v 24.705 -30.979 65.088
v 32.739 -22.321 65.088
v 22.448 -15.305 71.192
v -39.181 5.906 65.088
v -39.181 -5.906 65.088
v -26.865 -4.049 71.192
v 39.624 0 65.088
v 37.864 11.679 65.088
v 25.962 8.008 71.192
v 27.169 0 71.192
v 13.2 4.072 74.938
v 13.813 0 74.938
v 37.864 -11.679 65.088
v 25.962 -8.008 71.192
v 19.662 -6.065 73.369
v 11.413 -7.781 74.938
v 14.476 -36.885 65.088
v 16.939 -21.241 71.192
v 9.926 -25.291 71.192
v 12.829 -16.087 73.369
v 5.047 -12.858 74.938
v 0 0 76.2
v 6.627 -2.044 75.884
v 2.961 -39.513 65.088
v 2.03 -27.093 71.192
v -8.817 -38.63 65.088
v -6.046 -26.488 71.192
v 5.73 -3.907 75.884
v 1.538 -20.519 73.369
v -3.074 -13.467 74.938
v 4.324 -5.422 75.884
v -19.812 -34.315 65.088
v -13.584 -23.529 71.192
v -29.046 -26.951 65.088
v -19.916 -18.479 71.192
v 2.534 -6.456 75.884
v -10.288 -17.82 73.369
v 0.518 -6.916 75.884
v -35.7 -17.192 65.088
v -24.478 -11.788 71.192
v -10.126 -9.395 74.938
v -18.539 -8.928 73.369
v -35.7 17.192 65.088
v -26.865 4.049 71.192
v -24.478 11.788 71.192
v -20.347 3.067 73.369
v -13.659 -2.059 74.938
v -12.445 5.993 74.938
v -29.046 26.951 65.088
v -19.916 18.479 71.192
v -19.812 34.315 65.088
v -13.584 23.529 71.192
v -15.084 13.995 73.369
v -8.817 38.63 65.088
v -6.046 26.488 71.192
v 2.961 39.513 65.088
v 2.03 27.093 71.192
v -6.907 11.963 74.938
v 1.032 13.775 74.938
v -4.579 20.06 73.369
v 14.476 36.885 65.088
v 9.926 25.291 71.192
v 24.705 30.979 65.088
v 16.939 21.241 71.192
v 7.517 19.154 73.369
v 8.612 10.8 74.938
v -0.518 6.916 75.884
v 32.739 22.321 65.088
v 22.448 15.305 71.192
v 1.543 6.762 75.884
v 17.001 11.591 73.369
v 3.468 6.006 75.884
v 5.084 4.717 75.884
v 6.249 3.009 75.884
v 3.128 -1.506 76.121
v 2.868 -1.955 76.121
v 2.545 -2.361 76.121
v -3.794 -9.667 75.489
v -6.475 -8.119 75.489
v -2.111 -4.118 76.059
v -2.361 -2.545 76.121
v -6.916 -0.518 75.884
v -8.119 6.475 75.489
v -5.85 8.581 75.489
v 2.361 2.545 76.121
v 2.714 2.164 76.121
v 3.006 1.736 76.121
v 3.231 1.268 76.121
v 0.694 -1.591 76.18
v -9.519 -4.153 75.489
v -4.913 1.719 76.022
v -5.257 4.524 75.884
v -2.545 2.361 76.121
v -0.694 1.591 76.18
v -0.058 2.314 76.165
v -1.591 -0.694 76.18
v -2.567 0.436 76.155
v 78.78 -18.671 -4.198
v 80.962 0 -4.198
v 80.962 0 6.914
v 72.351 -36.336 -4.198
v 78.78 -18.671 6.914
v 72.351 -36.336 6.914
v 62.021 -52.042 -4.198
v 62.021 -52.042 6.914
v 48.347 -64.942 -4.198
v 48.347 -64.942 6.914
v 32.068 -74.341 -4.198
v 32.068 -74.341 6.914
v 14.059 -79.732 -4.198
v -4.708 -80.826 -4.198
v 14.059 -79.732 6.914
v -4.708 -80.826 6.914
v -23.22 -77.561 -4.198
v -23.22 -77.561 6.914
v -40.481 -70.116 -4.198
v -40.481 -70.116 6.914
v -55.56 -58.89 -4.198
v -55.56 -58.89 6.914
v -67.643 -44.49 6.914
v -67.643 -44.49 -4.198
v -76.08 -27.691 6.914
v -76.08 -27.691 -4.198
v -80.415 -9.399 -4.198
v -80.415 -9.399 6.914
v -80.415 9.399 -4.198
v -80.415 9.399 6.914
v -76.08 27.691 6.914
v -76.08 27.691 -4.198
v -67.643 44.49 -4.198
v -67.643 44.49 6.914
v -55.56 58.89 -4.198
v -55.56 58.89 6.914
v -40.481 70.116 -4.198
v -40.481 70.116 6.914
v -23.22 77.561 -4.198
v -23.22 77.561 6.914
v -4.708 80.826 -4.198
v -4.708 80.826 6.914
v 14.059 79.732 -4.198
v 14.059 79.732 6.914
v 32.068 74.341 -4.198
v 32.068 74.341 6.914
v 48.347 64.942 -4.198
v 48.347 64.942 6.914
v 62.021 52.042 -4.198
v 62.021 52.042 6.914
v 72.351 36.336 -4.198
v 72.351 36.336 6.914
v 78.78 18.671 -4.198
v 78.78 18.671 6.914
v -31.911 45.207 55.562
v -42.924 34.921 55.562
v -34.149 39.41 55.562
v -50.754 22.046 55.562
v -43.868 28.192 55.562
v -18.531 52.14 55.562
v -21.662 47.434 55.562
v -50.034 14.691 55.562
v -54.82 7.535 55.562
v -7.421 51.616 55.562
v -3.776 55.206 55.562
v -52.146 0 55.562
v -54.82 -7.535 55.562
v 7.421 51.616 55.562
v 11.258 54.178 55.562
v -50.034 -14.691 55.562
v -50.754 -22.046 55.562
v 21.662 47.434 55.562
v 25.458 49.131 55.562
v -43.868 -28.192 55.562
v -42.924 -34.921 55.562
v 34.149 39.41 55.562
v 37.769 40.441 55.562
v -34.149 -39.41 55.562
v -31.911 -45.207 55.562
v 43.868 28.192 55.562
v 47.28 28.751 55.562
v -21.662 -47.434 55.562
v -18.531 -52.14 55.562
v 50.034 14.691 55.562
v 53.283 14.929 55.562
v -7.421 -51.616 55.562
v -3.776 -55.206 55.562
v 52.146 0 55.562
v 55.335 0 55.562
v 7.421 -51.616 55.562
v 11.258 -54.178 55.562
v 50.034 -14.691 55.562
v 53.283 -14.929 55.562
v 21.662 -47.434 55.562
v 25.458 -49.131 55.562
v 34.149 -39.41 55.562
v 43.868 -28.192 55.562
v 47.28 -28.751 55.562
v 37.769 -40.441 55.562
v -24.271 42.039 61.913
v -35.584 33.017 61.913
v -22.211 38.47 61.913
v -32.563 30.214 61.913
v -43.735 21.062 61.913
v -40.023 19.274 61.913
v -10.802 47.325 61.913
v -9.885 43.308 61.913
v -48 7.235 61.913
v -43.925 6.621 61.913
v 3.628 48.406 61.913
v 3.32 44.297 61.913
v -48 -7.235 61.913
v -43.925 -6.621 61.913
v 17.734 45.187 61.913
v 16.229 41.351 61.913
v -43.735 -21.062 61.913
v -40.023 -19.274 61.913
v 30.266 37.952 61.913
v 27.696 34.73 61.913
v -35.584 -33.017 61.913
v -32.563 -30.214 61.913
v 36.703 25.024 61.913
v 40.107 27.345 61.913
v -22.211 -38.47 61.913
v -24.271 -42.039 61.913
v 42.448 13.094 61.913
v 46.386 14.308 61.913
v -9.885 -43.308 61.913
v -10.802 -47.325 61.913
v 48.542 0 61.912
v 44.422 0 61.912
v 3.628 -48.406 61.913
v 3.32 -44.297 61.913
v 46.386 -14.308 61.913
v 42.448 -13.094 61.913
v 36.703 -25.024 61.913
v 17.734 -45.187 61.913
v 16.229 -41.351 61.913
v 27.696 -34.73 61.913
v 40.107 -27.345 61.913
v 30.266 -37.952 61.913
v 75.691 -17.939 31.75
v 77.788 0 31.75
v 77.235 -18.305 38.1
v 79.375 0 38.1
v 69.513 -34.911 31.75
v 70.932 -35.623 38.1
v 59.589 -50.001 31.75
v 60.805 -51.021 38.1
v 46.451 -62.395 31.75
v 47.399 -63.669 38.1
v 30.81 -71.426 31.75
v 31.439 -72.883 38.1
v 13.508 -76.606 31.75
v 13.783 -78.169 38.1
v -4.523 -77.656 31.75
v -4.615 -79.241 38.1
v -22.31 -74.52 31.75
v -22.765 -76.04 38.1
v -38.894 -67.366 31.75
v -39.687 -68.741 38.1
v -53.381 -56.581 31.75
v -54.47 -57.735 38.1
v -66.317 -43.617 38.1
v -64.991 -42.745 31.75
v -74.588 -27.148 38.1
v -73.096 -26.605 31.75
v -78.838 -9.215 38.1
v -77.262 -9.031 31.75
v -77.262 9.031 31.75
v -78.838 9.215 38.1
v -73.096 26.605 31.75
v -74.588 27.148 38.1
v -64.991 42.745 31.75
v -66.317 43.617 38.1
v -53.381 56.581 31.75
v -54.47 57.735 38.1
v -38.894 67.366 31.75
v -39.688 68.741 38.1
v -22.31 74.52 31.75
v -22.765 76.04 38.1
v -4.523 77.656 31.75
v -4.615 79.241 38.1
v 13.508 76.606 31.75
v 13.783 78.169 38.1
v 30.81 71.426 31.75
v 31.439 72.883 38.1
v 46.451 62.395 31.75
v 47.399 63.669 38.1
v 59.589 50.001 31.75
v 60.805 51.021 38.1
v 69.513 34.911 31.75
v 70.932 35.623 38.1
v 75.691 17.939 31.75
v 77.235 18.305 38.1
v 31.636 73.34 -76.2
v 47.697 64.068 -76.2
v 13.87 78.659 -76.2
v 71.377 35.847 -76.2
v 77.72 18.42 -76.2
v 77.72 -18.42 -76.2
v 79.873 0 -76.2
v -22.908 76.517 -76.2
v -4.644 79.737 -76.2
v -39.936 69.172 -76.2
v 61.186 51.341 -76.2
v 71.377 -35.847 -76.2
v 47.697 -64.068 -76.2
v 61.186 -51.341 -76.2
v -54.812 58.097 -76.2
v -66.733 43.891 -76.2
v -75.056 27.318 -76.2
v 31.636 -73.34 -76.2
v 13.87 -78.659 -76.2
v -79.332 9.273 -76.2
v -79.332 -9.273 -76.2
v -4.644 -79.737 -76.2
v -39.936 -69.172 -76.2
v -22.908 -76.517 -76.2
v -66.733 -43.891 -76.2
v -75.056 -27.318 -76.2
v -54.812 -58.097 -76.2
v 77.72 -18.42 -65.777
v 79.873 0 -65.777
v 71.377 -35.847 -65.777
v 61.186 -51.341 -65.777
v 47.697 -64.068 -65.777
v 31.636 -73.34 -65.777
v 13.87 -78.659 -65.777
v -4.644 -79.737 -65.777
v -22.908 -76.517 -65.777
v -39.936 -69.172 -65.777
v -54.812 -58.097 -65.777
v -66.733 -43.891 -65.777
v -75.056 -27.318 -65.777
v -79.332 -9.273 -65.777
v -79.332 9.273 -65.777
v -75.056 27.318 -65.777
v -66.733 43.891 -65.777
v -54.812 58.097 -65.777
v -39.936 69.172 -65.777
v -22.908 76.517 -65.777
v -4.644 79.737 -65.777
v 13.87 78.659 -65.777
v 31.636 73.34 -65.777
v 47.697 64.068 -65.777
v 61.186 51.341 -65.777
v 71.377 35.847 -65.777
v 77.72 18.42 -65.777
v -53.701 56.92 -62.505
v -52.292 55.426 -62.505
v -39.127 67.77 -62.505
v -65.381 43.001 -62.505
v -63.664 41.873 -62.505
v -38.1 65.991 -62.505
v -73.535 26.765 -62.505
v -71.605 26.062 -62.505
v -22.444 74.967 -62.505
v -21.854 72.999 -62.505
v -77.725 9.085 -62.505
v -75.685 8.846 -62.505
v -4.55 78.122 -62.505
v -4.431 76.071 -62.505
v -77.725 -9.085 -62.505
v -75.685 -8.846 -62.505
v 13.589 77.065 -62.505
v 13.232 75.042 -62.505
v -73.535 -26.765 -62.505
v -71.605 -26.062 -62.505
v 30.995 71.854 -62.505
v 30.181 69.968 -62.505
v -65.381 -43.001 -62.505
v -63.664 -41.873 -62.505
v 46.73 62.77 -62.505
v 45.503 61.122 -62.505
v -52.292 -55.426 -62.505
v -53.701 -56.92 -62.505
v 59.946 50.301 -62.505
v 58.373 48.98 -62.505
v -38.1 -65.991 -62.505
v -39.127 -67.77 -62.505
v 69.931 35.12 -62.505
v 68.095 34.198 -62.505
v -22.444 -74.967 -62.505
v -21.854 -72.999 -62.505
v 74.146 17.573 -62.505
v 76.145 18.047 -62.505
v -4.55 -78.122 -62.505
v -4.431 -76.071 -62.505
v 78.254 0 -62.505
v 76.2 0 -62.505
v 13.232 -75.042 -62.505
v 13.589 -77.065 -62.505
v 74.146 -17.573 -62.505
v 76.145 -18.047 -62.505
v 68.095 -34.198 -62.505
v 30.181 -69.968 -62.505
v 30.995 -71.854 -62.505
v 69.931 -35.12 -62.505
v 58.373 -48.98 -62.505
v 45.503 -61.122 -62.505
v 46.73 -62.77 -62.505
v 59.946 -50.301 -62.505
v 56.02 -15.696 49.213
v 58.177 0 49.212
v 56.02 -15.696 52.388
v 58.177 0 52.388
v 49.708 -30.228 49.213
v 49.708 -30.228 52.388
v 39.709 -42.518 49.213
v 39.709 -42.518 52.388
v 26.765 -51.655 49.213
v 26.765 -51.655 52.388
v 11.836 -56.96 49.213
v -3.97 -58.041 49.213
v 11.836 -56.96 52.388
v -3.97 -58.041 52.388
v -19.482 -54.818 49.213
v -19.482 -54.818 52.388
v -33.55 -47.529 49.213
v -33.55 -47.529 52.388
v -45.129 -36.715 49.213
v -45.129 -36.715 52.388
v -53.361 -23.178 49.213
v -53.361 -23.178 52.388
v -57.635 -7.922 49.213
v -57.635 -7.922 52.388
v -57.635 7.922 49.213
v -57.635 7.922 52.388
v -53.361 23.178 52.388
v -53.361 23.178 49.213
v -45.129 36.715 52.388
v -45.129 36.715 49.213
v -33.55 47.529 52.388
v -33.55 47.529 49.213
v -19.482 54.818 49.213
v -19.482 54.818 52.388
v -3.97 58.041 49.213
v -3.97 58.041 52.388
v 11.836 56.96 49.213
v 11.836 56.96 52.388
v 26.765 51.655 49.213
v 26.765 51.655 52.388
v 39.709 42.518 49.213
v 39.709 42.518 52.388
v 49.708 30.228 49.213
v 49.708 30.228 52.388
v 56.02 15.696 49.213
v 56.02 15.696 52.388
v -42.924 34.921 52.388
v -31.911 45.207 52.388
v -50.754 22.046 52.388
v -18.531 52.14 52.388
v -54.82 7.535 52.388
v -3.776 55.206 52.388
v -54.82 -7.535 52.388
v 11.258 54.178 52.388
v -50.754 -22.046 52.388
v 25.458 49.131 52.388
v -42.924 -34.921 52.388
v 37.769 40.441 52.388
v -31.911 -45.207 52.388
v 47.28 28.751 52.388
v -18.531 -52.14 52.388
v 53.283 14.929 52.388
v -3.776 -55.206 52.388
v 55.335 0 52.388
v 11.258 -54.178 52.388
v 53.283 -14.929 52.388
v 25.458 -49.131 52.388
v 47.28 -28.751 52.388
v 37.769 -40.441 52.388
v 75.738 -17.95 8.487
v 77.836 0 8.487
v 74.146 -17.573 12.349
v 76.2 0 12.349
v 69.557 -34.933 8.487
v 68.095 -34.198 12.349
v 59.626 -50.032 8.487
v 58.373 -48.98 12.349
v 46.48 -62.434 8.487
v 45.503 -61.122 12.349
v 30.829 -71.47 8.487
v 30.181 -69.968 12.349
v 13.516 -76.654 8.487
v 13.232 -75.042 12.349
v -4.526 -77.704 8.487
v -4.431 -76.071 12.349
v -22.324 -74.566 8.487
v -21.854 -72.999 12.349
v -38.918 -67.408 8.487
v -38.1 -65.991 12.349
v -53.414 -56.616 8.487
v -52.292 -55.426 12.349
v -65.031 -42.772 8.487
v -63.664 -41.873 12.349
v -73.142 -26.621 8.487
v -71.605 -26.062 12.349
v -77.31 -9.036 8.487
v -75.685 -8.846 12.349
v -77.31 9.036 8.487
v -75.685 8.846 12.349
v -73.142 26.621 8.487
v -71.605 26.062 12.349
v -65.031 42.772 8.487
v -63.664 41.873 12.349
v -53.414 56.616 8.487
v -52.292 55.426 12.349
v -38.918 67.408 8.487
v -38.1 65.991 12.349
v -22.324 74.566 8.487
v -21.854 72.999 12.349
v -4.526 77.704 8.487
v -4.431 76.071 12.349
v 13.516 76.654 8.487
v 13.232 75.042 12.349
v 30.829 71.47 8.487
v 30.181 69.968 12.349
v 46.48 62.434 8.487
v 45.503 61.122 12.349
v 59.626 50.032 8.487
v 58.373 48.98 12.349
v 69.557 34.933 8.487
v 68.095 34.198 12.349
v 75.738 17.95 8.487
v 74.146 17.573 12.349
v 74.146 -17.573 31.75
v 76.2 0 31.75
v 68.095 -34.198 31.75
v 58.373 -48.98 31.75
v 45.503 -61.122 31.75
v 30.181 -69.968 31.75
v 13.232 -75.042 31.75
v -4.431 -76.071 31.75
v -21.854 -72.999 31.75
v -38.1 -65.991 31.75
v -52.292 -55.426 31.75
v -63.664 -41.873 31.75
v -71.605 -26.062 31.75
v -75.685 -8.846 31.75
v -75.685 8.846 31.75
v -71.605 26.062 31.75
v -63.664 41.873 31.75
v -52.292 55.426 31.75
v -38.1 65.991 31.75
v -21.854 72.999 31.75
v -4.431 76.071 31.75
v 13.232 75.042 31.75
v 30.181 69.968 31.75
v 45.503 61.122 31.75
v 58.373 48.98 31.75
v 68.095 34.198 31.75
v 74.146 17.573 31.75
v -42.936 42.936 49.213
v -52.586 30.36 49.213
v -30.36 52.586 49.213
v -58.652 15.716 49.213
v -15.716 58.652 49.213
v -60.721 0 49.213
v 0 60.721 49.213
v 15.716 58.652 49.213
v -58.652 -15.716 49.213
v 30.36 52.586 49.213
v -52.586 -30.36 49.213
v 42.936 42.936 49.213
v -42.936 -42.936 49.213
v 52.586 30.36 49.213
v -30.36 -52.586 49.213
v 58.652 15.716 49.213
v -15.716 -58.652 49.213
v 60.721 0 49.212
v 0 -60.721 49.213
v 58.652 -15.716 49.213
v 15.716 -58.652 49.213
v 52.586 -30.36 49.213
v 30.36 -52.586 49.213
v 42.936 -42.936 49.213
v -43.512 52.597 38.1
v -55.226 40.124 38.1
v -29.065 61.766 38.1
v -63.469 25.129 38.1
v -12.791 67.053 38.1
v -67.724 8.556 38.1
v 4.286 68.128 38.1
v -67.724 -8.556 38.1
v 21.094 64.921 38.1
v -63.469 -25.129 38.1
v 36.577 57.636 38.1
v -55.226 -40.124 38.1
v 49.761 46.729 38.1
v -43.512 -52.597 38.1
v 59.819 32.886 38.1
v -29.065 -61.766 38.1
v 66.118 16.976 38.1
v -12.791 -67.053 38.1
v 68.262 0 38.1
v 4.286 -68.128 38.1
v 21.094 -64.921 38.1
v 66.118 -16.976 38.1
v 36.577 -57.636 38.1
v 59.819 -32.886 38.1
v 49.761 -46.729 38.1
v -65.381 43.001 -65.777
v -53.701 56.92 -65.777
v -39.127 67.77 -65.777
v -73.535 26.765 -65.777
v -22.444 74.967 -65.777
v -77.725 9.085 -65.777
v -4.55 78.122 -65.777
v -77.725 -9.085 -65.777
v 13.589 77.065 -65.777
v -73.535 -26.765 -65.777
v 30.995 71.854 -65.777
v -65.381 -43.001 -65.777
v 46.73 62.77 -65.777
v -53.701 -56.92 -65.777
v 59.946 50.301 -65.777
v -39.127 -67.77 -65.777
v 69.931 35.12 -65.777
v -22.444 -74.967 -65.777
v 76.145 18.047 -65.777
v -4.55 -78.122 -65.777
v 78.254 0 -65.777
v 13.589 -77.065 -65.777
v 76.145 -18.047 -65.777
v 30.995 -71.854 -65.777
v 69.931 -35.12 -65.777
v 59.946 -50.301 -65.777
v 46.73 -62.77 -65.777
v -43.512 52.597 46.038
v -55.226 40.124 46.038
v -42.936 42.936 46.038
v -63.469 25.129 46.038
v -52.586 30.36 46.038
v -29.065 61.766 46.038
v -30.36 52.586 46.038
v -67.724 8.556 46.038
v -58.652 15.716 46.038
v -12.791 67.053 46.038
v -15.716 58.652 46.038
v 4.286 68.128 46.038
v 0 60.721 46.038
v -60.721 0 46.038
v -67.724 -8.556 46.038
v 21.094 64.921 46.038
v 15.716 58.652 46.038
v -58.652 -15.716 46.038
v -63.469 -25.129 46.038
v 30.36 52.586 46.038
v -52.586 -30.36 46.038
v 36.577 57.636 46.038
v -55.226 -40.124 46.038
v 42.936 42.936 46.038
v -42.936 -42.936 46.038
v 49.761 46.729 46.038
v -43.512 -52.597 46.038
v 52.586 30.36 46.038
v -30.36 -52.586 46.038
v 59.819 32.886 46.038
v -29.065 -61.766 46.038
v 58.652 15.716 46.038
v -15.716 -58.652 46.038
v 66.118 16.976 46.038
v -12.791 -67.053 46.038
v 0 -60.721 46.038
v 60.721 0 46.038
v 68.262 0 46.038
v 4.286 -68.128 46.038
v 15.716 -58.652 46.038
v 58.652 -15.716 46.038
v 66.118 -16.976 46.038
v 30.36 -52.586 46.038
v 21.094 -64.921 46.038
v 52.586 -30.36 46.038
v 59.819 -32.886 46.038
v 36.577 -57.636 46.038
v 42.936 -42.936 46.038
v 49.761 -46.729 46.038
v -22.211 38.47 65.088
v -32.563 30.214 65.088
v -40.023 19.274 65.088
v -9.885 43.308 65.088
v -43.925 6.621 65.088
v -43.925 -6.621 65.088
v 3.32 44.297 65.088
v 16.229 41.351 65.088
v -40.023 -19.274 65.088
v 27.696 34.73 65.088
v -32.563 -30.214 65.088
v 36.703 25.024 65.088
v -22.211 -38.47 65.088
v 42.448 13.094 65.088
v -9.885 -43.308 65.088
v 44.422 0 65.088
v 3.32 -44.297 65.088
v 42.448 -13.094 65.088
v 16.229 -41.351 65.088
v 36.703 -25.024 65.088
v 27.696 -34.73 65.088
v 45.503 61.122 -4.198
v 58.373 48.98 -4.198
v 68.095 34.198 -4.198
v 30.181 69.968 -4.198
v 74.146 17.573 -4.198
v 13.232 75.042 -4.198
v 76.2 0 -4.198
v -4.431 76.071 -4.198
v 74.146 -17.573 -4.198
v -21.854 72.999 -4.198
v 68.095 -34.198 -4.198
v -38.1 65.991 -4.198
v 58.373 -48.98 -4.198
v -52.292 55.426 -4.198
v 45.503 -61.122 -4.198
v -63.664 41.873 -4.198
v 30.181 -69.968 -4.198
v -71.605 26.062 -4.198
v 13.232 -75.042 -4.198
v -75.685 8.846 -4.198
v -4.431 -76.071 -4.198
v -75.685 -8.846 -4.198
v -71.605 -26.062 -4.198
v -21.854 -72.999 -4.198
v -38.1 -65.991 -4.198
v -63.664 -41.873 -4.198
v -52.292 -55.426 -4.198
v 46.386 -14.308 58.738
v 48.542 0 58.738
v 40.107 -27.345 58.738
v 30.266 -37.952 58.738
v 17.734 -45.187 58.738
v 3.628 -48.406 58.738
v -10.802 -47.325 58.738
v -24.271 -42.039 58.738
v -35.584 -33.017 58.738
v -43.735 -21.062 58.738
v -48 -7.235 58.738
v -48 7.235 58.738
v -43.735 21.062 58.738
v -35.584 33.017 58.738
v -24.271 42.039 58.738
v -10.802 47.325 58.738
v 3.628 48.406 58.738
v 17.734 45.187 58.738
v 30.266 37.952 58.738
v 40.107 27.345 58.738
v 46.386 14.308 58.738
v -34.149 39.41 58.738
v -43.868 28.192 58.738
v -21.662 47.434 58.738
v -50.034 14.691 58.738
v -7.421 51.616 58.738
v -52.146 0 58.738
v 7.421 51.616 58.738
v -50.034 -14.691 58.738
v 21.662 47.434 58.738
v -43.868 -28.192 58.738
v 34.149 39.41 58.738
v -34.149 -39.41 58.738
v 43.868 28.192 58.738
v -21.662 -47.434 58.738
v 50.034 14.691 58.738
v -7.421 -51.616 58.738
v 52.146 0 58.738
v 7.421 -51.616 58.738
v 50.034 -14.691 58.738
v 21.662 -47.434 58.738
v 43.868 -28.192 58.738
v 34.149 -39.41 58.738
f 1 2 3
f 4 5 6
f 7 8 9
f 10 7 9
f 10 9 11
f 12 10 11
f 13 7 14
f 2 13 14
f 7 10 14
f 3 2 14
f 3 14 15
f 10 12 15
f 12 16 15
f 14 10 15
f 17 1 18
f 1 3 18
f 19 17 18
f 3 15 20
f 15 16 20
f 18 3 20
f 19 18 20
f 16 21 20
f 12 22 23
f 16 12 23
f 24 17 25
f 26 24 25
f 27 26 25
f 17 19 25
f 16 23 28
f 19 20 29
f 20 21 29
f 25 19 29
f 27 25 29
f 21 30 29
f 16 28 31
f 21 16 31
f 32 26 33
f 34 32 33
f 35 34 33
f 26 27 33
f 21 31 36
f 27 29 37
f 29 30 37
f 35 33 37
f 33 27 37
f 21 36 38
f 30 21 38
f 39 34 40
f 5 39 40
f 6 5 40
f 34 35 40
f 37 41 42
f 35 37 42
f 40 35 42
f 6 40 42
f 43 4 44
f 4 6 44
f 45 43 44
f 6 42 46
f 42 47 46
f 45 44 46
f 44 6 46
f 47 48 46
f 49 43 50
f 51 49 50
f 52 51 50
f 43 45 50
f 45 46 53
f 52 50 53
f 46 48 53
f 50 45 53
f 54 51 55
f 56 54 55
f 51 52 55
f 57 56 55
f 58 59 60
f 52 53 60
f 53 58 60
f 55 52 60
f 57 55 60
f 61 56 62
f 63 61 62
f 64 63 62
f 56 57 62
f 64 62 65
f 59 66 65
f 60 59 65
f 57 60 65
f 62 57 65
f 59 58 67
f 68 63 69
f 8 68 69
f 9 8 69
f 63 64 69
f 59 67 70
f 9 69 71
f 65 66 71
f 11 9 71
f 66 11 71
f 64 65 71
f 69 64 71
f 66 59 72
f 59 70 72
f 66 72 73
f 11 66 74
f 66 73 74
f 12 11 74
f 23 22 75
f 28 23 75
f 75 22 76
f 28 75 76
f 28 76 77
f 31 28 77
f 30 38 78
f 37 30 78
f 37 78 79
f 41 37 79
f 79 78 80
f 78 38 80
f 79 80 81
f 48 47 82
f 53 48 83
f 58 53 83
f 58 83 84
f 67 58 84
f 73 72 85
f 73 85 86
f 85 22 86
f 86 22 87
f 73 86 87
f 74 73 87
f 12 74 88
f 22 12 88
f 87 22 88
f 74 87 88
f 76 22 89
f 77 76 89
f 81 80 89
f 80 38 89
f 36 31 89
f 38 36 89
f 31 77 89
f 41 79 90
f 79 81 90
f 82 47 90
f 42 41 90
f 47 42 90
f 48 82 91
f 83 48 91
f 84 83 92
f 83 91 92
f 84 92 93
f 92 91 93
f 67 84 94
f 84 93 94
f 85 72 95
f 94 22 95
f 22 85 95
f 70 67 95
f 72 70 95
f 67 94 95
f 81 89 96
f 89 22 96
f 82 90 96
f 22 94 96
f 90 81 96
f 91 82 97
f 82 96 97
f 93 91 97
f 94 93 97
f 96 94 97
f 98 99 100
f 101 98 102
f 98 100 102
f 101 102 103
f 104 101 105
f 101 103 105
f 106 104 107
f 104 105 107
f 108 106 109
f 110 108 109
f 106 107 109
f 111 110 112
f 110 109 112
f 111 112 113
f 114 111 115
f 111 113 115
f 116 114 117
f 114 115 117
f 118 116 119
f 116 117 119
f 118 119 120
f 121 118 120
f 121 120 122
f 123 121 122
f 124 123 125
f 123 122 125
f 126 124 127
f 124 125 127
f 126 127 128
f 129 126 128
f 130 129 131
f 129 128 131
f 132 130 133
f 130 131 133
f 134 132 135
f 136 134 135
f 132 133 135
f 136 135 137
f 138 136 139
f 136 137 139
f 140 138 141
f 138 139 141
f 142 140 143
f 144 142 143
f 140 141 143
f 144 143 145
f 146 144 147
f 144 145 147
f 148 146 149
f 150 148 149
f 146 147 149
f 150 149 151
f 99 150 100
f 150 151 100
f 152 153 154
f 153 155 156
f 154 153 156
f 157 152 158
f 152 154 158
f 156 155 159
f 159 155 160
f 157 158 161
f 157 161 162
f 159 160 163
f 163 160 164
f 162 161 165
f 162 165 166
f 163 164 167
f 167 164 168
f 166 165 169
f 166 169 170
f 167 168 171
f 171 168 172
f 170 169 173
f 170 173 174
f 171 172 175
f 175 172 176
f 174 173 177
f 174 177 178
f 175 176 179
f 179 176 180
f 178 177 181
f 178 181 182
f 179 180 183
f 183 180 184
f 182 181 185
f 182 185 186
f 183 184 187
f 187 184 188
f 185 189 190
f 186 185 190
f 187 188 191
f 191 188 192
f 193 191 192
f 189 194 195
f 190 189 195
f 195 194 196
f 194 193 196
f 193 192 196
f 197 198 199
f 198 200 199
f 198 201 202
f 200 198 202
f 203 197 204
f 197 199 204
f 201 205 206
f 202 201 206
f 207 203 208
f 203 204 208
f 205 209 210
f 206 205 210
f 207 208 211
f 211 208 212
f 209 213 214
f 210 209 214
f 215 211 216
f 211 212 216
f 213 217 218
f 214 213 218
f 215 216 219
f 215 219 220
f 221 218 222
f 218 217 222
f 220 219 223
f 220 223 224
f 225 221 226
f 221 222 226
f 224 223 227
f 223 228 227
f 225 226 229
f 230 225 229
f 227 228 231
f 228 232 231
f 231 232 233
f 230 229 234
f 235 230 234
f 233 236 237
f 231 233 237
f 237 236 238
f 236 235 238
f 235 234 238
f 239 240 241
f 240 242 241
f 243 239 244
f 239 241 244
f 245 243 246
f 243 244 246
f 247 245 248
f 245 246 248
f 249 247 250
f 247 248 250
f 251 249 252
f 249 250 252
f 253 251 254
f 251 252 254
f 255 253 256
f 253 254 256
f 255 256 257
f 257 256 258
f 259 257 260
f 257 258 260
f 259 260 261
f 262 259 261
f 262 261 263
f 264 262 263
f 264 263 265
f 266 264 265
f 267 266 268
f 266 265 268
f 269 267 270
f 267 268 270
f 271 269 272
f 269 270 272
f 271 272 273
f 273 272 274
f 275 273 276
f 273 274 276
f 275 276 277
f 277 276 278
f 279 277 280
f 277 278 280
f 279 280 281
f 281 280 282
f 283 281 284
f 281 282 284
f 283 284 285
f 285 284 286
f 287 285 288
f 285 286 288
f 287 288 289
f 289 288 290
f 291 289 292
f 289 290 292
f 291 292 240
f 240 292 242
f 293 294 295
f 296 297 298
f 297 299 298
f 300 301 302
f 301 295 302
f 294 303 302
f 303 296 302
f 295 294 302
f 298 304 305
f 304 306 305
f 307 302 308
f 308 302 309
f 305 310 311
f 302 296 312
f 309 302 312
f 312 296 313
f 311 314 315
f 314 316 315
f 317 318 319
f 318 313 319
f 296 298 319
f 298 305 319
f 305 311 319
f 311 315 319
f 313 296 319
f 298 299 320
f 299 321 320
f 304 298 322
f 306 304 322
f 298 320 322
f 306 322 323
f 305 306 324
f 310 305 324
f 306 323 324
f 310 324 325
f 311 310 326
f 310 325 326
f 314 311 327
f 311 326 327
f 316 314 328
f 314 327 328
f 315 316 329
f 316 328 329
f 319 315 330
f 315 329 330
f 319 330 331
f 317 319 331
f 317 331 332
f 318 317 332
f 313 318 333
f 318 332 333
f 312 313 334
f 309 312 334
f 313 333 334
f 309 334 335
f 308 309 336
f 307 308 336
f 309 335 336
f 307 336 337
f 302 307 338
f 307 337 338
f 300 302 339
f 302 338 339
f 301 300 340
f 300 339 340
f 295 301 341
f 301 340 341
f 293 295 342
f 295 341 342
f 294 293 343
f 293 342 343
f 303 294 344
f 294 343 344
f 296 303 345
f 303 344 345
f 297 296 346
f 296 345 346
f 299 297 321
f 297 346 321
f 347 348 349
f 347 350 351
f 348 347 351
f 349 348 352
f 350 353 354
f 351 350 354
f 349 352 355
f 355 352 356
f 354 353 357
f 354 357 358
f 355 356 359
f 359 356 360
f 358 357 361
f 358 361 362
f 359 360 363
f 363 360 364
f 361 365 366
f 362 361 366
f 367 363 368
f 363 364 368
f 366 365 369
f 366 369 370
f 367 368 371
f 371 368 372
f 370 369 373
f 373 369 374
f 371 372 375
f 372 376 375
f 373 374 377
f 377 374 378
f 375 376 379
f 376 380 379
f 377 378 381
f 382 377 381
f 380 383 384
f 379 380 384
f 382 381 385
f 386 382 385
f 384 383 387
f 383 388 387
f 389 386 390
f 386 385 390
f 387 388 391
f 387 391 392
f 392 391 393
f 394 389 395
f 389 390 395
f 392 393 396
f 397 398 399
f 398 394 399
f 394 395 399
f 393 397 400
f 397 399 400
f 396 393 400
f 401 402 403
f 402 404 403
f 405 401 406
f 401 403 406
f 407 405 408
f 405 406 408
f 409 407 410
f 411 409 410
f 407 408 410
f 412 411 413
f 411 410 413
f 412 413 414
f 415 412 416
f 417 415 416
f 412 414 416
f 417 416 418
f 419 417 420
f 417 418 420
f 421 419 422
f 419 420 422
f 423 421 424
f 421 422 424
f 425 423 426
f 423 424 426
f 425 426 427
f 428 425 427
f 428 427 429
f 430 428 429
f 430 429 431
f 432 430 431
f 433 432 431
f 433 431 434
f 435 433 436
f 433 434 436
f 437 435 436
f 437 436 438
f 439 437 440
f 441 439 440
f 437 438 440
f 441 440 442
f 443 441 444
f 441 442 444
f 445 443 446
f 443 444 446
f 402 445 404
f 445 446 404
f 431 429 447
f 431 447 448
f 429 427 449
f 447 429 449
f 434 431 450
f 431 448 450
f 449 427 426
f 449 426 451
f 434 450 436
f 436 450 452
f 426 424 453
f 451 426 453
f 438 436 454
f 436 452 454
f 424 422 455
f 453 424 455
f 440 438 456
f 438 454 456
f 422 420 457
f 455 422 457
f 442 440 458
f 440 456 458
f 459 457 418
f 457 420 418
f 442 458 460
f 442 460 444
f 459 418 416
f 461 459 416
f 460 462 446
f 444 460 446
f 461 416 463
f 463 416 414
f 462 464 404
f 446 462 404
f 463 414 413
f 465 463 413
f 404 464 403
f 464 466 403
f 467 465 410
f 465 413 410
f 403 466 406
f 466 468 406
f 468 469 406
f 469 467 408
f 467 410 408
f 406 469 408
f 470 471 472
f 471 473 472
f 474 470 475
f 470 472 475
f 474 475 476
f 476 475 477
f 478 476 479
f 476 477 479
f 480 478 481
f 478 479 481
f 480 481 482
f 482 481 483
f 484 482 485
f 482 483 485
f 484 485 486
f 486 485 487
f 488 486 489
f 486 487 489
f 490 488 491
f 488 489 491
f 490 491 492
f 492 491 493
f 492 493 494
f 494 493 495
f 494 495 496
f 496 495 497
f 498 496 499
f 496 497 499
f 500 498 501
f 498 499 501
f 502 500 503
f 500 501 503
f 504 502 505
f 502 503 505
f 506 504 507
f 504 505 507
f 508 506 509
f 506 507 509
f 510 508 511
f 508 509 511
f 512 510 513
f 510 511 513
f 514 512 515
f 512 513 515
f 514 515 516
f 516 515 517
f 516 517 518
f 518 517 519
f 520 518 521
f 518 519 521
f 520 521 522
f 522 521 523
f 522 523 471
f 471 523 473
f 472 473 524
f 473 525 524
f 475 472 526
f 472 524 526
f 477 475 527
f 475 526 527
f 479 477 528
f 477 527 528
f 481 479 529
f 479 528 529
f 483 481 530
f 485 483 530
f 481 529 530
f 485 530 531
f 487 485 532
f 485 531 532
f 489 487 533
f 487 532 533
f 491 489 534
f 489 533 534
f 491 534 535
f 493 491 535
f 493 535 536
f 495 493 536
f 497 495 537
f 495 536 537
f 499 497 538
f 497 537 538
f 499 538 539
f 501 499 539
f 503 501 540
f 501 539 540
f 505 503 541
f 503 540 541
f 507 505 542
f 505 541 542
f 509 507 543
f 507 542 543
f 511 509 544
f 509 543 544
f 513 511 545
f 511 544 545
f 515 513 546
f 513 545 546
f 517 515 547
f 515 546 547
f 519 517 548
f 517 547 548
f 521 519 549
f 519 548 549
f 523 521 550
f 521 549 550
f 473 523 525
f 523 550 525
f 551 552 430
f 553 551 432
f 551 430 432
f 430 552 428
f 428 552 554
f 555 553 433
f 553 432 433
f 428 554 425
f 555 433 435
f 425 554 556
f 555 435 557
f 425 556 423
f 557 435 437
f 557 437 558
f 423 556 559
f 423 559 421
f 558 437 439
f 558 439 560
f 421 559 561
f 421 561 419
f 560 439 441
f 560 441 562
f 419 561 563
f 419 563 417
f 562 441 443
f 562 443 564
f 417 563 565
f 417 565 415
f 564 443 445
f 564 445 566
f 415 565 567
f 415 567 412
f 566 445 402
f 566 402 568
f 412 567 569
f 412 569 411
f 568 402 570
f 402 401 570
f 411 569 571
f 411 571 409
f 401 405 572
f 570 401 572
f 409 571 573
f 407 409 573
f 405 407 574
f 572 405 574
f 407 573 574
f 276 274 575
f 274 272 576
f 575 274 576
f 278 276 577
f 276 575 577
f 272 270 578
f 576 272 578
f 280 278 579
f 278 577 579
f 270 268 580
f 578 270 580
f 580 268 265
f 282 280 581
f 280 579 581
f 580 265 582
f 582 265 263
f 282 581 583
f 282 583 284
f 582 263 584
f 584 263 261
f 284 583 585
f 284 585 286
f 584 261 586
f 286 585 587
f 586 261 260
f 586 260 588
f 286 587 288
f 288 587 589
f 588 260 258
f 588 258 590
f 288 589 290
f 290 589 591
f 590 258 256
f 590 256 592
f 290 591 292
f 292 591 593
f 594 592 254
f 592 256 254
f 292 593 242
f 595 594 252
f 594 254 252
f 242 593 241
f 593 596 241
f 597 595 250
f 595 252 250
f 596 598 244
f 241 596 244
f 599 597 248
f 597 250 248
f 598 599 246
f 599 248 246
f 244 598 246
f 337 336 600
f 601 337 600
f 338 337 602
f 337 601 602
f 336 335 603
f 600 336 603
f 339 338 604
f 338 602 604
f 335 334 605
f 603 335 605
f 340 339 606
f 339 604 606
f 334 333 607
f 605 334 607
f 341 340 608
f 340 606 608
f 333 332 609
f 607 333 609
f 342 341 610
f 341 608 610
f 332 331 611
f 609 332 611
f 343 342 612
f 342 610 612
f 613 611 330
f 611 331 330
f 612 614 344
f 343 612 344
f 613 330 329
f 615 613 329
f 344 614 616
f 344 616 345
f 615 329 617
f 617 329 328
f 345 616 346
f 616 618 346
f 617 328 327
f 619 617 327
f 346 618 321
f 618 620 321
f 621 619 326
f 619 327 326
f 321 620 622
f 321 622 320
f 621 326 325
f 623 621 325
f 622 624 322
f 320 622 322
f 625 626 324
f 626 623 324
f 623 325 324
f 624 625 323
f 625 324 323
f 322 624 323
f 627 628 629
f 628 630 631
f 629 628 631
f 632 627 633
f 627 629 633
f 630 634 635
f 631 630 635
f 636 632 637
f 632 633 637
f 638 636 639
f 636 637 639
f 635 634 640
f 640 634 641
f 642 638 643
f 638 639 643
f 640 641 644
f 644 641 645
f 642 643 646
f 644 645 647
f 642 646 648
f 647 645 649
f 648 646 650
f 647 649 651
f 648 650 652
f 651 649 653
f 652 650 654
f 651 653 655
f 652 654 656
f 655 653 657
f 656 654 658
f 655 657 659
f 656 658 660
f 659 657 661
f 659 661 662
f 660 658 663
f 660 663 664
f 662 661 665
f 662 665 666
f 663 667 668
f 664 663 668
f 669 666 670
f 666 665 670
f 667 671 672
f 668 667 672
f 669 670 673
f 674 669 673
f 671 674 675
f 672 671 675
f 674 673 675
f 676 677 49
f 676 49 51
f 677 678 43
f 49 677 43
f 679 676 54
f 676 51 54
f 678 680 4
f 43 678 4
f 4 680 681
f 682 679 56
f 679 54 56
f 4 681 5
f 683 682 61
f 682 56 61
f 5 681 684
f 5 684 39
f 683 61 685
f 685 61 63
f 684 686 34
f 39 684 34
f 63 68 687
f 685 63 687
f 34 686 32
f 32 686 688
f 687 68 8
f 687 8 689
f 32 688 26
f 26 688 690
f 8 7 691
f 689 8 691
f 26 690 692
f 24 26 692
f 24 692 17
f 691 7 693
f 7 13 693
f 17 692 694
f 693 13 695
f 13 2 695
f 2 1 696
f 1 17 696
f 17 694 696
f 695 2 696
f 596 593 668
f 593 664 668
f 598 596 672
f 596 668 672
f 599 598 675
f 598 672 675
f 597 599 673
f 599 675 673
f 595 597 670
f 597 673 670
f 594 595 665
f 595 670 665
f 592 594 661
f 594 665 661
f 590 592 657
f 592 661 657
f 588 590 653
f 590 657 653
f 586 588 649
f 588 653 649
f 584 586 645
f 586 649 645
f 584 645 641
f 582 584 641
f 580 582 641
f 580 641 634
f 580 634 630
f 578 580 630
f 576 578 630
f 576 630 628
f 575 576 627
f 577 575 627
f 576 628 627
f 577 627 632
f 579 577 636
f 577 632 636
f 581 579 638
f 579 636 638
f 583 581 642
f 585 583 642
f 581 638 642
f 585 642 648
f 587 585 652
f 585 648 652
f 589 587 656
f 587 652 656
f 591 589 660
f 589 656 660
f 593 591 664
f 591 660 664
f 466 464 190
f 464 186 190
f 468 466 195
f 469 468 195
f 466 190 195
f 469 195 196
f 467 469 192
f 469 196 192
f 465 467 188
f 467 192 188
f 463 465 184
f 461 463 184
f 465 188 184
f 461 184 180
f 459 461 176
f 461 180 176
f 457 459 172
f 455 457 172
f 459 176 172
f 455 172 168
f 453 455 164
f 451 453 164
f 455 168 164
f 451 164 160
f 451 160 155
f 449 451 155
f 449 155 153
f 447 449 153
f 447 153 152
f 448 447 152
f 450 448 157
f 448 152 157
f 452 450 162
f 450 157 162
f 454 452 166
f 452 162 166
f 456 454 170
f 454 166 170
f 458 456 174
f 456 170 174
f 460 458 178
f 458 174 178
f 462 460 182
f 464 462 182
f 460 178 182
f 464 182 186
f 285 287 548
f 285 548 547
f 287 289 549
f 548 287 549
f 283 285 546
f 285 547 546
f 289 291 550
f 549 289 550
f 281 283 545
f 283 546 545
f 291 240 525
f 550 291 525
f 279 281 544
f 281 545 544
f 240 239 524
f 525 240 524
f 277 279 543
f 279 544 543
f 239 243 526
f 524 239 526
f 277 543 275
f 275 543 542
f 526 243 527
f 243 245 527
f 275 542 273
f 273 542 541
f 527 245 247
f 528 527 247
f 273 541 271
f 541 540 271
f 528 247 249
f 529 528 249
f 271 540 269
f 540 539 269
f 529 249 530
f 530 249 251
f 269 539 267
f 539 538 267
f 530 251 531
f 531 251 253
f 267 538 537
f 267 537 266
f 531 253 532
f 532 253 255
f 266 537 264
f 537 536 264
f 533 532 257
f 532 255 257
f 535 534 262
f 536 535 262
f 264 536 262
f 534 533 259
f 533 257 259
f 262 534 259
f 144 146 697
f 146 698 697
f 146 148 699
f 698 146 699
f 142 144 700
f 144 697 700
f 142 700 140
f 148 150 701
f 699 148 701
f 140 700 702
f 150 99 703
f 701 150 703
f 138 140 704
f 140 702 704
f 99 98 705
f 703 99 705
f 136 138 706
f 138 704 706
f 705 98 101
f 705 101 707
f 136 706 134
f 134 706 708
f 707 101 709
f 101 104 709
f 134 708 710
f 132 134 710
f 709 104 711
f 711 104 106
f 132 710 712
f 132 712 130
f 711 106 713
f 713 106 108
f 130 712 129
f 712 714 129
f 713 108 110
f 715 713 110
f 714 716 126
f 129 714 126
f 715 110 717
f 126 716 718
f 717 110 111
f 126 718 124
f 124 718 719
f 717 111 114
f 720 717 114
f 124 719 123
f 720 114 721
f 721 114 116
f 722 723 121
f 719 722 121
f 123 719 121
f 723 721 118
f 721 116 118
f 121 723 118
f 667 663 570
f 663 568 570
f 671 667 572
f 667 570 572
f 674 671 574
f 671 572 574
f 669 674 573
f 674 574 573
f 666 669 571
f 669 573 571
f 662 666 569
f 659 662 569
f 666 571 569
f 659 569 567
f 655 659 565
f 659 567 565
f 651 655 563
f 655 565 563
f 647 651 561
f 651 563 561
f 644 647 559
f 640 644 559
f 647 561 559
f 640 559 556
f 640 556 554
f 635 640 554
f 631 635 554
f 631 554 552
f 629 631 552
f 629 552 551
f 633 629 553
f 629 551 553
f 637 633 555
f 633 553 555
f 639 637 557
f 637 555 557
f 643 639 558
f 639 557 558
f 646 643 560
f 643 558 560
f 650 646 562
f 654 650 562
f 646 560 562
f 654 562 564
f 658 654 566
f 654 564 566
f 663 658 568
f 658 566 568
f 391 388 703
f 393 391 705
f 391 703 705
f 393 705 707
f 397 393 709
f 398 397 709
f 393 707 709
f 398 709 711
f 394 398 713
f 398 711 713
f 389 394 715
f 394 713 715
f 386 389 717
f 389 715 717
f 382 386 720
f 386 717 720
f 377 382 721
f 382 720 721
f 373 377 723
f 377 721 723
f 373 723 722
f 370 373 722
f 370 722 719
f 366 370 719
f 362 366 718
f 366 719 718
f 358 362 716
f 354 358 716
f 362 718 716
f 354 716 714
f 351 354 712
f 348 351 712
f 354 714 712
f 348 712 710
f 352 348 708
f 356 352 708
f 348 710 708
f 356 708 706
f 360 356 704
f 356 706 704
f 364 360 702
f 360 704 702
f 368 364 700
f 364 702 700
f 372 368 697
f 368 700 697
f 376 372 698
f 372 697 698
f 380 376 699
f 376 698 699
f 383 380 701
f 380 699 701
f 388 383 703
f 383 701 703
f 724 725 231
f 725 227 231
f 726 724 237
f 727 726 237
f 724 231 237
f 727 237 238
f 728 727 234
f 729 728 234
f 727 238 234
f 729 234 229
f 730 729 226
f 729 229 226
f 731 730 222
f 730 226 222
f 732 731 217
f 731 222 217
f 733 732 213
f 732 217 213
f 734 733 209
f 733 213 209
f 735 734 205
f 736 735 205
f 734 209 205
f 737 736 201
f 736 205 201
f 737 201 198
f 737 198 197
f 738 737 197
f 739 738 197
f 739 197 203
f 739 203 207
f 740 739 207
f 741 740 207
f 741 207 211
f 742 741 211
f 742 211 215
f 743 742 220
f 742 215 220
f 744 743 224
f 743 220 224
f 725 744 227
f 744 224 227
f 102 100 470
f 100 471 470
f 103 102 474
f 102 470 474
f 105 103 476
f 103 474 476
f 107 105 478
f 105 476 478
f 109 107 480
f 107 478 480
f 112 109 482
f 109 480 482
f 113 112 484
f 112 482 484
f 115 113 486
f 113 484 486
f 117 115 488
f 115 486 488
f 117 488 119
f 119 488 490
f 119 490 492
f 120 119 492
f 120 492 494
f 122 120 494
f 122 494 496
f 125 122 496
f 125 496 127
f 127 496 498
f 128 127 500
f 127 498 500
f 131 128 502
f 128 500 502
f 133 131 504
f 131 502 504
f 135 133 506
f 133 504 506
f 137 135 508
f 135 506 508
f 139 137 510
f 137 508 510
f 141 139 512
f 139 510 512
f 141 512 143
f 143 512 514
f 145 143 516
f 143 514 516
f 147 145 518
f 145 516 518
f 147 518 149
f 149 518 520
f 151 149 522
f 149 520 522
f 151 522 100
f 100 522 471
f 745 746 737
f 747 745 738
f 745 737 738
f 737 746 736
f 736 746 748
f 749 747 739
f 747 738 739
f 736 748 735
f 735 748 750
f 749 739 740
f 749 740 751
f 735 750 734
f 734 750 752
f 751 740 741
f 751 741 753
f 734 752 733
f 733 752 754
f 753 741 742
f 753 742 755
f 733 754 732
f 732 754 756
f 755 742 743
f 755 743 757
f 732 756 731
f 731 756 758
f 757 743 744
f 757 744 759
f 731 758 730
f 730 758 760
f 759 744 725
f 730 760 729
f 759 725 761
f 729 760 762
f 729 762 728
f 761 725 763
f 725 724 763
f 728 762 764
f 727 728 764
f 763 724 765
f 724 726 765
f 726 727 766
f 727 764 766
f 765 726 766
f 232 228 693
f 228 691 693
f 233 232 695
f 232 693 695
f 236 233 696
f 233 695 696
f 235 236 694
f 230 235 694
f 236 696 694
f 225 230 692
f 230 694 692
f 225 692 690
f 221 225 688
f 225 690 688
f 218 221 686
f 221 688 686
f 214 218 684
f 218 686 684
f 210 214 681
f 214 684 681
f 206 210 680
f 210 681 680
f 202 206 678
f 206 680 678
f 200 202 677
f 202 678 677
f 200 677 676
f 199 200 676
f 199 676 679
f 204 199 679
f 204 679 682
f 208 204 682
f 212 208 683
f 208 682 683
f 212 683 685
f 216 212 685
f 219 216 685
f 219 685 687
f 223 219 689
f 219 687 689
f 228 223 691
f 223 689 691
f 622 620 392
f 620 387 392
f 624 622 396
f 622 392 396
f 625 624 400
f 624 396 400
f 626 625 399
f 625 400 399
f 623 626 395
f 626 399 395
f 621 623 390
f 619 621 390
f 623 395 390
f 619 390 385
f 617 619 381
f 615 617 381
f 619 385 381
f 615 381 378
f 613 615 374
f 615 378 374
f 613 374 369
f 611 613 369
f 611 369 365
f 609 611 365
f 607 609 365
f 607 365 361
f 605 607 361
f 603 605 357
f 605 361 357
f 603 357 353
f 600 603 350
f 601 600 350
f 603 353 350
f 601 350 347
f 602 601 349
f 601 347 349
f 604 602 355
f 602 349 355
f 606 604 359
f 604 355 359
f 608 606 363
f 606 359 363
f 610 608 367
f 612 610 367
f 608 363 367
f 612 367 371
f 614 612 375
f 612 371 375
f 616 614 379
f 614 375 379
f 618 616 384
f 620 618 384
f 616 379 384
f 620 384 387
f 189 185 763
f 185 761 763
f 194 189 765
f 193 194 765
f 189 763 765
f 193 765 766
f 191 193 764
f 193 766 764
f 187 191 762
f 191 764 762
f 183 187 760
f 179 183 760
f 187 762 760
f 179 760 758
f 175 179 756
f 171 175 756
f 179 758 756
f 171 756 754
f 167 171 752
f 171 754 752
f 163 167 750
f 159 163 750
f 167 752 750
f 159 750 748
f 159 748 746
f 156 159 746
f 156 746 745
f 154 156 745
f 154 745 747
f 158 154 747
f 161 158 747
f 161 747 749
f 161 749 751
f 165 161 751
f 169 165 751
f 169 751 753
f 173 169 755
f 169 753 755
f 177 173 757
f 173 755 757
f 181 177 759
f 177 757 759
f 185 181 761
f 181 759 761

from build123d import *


with BuildPart() as f1:
    # F0 (on Front) → F1 (revolve)
    with BuildSketch(Plane.XZ):
        with BuildLine():
            Line((0, 76.2), (0, 38.1))
            Line((0, 38.1), (0, -76.2))
            Line((0, -76.2), (79.872511, -76.2))
            Line((79.872511, -76.2), (79.872511, -65.777272))
            Line((79.872511, -65.777272), (78.254335, -65.777272))
            Line((78.254335, -65.777272), (78.254335, -62.504791))
            Line((78.254335, -62.504791), (76.2, -62.504791))
            Line((76.2, -62.504791), (76.2, -4.198033))
            Line((76.2, -4.198033), (80.9625, -4.198033))
            Line((80.9625, -4.198033), (80.9625, 6.914467))
            Line((80.9625, 6.914467), (77.836014, 8.487052))
            Line((77.836014, 8.487052), (76.2, 12.349062))
            Line((76.2, 12.349062), (76.2, 31.75))
            Line((76.2, 31.75), (77.7875, 31.75))
            Line((77.7875, 31.75), (79.375, 38.1))
            Line((79.375, 38.1), (68.2625, 38.1))
            Line((68.2625, 38.1), (68.2625, 46.0375))
            Line((68.2625, 46.0375), (60.720578, 46.0375))
            Line((60.720578, 46.0375), (60.720578, 49.2125))
            Line((60.720578, 49.2125), (58.177056, 49.2125))
            Line((58.177056, 49.2125), (58.177056, 52.3875))
            Line((58.177056, 52.3875), (55.33525, 52.3875))
            Line((55.33525, 52.3875), (55.33525, 55.5625))
            Line((55.33525, 55.5625), (52.146415, 55.5625))
            Line((52.146415, 55.5625), (52.146415, 58.7375))
            Line((52.146415, 58.7375), (48.542209, 58.7375))
            Line((48.542209, 58.7375), (48.542209, 61.9125))
            Line((48.542209, 61.9125), (44.421643, 61.9125))
            Line((44.421643, 61.9125), (44.421643, 65.0875))
            Line((44.421643, 65.0875), (39.623949, 65.0875))
            ThreePointArc((39.623949, 65.0875), (20.576352, 73.369297), (0, 76.2))
        make_face()
    revolve(axis=Axis((0, 0, -19.05), (0, 0, -1)))


solid = f1.part
